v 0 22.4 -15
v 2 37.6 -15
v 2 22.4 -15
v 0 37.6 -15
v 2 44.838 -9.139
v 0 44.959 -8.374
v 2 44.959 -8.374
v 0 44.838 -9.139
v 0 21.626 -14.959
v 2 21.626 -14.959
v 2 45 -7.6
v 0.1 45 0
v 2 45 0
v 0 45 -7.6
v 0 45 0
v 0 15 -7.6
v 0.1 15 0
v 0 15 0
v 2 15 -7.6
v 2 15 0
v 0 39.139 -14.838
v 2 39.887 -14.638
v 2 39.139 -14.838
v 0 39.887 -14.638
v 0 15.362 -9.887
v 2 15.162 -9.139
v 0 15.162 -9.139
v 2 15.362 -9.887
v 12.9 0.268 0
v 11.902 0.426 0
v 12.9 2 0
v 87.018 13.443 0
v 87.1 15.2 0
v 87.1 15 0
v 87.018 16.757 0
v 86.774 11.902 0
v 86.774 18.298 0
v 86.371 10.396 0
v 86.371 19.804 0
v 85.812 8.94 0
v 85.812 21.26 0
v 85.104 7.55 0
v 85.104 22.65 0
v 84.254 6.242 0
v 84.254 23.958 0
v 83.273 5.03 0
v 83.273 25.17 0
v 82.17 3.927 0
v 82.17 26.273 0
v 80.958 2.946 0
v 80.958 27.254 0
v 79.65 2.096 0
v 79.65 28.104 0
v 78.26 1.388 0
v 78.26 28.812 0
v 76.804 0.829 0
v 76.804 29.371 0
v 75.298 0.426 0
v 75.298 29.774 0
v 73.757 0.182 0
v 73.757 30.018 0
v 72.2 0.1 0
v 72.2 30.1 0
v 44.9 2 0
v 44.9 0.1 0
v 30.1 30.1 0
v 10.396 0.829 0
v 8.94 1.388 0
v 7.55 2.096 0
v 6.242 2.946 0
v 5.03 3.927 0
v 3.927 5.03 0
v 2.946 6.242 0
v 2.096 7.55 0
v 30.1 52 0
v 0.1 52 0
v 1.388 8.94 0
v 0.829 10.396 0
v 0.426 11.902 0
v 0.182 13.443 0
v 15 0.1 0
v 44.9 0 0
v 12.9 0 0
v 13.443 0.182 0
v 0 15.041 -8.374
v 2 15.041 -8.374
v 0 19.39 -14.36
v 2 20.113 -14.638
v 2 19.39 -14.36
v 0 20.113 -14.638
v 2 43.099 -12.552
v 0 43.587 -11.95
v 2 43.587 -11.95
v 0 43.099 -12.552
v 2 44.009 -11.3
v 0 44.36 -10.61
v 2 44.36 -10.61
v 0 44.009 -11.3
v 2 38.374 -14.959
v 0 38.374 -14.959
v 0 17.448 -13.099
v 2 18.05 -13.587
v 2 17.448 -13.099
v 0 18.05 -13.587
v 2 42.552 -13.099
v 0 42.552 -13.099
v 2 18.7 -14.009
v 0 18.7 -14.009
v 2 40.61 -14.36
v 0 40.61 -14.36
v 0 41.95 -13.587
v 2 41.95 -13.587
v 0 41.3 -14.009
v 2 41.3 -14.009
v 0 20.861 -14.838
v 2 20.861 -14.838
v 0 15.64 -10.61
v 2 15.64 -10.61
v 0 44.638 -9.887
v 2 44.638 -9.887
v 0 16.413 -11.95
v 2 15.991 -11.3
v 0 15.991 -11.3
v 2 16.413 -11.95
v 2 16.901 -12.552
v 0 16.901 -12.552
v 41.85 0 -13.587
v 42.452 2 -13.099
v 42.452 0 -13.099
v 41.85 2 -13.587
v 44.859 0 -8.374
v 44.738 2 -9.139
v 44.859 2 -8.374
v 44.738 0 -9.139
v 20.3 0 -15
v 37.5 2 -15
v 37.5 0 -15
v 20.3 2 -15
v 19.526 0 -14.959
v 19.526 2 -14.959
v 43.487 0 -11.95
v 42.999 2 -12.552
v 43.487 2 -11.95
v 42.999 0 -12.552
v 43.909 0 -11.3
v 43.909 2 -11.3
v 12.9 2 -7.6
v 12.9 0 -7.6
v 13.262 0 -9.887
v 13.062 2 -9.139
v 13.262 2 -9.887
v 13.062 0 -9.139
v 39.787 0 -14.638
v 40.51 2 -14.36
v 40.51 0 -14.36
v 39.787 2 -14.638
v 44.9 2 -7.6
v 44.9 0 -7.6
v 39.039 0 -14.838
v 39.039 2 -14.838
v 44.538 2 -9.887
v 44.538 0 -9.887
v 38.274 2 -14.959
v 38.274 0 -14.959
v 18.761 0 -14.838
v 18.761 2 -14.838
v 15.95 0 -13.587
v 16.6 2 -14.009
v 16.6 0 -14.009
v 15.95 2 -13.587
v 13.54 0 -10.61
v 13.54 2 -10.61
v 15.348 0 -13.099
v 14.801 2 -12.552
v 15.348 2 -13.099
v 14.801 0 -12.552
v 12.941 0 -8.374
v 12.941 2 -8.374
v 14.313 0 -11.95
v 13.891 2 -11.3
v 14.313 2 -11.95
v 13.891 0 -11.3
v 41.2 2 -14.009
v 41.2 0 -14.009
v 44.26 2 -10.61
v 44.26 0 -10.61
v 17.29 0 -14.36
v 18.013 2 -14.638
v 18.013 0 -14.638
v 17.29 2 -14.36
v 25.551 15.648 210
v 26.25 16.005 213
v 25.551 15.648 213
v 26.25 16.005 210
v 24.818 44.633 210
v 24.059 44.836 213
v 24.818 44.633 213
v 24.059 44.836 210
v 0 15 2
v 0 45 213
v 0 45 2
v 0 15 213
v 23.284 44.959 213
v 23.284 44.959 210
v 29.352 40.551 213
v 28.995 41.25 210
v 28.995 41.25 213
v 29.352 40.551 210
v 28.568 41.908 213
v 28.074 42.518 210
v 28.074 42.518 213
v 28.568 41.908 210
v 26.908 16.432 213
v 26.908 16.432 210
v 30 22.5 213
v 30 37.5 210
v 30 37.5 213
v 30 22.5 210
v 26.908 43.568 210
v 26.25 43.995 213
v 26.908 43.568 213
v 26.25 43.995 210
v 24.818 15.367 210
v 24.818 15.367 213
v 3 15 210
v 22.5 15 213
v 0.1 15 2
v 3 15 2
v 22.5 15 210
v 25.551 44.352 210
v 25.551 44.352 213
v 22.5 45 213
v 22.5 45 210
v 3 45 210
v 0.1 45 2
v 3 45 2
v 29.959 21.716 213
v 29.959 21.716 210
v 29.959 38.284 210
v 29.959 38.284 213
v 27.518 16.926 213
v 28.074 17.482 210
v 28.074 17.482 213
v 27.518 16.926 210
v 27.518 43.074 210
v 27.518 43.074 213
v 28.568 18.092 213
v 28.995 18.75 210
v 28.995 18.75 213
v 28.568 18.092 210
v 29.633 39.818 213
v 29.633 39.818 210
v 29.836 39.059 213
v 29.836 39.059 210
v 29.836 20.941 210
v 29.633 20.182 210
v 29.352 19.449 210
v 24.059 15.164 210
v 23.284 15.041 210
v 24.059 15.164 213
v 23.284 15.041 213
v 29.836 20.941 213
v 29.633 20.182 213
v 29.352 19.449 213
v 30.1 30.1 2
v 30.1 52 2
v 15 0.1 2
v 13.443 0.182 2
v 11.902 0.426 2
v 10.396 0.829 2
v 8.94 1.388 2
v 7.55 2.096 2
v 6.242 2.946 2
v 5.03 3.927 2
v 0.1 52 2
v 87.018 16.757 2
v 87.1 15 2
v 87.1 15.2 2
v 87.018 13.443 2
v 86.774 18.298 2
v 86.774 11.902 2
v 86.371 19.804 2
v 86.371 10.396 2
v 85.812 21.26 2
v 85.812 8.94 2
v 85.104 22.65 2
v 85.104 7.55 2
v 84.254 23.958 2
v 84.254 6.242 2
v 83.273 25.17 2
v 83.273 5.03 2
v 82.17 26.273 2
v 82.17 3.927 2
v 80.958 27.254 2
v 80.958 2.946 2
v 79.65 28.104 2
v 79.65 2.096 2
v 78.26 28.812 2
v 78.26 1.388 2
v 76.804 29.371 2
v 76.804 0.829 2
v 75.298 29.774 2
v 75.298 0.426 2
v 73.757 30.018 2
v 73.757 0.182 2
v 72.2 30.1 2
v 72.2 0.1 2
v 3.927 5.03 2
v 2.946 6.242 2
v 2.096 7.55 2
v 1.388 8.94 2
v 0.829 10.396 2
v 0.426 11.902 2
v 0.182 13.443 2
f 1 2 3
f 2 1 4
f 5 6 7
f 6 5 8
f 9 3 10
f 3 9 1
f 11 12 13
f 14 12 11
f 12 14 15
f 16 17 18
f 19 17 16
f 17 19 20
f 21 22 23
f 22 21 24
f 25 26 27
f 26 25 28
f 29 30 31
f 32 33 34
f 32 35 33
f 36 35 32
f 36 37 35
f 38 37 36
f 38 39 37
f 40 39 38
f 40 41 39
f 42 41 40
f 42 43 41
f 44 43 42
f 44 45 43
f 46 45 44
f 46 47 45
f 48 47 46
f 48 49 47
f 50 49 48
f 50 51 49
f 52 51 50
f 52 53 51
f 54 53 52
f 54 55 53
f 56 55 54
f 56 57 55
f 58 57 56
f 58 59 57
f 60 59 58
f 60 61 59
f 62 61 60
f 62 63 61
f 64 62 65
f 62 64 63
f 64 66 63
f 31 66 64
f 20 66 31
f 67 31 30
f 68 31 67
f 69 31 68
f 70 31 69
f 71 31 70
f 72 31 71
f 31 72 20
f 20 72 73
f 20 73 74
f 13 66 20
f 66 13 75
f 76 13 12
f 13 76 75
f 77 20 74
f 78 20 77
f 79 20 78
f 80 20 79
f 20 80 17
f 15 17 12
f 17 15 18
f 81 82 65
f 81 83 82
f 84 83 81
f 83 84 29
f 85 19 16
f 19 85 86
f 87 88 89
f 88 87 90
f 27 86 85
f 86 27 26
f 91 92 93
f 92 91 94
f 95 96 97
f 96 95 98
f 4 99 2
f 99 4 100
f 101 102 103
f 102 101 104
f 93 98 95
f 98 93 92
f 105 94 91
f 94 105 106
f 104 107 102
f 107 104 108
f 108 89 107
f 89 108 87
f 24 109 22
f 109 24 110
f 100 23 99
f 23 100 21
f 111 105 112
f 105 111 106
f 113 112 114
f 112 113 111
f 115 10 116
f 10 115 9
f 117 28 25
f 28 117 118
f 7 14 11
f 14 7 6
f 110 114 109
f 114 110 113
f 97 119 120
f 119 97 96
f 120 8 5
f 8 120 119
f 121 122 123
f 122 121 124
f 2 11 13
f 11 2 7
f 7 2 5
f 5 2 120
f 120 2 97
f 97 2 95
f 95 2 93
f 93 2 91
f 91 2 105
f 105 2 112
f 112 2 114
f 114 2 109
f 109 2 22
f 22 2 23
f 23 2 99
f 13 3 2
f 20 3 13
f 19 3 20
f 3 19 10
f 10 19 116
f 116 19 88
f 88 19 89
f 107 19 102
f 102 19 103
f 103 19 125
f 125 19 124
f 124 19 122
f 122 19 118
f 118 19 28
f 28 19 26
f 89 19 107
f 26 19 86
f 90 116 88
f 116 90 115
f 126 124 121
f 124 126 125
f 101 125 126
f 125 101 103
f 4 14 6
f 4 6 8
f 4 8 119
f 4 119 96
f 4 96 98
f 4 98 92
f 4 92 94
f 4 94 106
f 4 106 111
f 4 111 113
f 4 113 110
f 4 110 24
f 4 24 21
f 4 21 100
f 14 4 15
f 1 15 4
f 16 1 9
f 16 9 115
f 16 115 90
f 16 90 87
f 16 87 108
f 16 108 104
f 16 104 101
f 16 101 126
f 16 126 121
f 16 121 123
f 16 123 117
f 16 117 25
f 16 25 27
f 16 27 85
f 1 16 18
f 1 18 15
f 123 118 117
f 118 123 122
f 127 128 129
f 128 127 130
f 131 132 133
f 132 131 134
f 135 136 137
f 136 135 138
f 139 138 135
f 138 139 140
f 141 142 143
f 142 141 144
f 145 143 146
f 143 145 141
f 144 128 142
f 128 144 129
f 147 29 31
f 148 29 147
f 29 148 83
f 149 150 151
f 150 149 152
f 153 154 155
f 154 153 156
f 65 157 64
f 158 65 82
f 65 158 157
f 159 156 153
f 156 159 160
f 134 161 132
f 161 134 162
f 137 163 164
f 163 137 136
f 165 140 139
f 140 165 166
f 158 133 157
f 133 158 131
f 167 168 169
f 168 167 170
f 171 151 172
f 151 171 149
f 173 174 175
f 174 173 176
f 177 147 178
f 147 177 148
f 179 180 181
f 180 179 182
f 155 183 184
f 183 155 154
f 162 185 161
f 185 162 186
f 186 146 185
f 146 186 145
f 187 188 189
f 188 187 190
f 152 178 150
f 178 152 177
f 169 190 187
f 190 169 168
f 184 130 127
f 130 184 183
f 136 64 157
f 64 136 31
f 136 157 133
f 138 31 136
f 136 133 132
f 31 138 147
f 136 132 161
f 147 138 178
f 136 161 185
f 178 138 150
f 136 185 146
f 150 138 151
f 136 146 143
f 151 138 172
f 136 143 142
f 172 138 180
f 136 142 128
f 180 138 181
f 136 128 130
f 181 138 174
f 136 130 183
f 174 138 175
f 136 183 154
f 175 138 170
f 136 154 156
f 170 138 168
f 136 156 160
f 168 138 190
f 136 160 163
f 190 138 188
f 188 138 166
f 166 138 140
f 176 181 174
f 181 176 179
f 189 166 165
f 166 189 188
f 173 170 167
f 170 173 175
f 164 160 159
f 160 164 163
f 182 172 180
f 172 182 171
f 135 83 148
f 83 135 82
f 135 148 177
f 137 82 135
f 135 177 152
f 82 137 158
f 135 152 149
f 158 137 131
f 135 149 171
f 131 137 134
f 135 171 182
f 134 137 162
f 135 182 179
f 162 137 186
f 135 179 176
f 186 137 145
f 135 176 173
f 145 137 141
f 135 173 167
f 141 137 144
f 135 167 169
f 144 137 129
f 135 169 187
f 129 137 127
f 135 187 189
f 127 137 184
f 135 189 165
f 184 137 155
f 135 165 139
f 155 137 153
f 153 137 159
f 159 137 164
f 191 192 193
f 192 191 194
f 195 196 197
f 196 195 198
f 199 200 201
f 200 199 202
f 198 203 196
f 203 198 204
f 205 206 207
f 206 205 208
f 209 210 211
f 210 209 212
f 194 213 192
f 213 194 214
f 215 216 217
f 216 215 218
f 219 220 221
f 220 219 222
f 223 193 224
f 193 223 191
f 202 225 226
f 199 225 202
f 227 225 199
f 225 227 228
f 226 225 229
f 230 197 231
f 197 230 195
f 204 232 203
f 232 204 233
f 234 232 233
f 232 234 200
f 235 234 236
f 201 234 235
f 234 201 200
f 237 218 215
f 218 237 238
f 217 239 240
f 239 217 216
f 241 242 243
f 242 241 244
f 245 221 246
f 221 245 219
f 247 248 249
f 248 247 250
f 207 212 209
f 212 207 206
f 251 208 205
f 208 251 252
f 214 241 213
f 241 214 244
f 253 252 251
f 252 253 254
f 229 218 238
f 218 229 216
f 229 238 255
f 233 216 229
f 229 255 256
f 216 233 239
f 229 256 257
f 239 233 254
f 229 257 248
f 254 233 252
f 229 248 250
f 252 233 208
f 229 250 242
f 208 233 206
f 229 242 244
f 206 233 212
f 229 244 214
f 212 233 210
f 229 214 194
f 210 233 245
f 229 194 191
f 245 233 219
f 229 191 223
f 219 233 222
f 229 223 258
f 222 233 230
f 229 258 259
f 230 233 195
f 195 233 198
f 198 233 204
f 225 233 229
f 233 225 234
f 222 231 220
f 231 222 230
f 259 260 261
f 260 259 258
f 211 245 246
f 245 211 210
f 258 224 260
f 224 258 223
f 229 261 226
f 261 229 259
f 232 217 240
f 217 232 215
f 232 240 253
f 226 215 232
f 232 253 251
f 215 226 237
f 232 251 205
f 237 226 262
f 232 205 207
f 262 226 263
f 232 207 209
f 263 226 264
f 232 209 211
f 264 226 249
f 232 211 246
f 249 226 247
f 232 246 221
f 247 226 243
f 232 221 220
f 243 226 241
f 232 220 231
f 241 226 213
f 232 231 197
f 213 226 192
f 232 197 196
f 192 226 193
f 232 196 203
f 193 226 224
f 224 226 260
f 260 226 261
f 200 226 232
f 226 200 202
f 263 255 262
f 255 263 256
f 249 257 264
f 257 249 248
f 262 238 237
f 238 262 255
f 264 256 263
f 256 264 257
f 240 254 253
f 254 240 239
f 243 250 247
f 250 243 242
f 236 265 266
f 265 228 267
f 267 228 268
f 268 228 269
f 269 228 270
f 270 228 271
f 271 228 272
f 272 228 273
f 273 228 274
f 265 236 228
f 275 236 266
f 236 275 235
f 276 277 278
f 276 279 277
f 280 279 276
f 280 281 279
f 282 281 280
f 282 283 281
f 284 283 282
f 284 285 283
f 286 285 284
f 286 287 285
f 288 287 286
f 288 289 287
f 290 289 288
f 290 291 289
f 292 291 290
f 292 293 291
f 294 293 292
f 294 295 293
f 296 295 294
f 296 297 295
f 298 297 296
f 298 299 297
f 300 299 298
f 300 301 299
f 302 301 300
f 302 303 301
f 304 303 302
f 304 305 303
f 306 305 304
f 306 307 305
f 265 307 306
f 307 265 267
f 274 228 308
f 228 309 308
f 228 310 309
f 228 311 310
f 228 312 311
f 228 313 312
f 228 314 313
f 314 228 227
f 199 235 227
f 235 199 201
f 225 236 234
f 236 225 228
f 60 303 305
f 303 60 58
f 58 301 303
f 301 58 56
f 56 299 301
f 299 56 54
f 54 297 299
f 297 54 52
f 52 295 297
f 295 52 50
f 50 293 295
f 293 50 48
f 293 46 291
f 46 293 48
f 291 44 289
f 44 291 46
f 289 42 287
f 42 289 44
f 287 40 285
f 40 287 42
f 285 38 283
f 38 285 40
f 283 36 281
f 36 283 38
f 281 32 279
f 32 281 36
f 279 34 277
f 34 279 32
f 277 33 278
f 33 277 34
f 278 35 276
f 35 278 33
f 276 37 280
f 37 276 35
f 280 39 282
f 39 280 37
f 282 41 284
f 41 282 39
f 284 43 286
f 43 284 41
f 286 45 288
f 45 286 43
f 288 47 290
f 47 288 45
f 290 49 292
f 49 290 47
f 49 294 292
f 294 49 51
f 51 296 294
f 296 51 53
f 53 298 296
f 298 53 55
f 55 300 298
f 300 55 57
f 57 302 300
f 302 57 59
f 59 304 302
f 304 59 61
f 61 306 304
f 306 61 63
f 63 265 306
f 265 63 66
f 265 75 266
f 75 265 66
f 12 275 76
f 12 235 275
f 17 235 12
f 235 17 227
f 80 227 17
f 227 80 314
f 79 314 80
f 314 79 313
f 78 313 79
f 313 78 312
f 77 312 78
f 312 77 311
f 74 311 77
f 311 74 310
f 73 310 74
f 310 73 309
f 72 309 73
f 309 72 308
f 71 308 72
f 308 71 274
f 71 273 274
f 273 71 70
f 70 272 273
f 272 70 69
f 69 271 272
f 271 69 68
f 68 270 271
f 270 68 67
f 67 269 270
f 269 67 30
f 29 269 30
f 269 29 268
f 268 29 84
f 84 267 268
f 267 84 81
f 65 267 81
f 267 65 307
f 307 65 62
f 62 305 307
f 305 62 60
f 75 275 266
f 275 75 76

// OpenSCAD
// file: ../modules.scad
description = "Common reusable OpenSCAD functions and modules";

// Clamp numeric value between bounds
function clamp(val, lo, hi) = max(lo, min(val, hi));

// Clamp chamfer height to half of available thickness
function clamp_chz(t, chz) = clamp(chz, 0, t/2);

// Clamp chamfer offsets to available XY span
function clamp_chxy(l, w, chx, chy) = [
  clamp(chx, 0, l/2 - tiny),
  clamp(chy, 0, w/2 - tiny)
];

// 2D rounded rectangle
// size = [width, height]
module rounded_rect(size=[10,10], radius=1, center=false) {
  width = size[0];
  height = size[1];
  r = min(radius, min(width, height)/2);
  translate(center ? [-width/2, -height/2] : [0, 0])
    offset(r=r)
      square([max(width - 2*r, tiny), max(height - 2*r, tiny)], center=false);
}

// 3D rounded box
// size = [width, depth, height]
module rounded_box(size=[10,10,10], radius=1, center=false) {
  width = size[0];
  depth = size[1];
  height = size[2];
  linear_extrude(height=height, center=center)
    rounded_rect([width, depth], radius, center=center);
}

// Cylindrical ring with chamfered top edge
// d_outer - outer diameter
// d_inner - inner diameter
// h - total height
// chamfer - radius for top edge transition
module round_chamfer_ring(d_outer, d_inner, h, chamfer) {
  h_ch = min(chamfer, h/2);
  difference() {
    cylinder(h=h - h_ch, d=d_outer);
    translate([0, 0, 0]) cylinder(h=h - h_ch + tiny, d=d_inner);
  }
  difference() {
    translate([0, 0, h - h_ch]) cylinder(h=h_ch, d1=d_outer, d2=max(d_outer - 2*h_ch, tiny));
    translate([0, 0, h - h_ch]) cylinder(h=h_ch + tiny, d1=d_inner, d2=max(d_inner + 2*h_ch, tiny));
  }
}

// Boolean inverse of child 2D geometry using large bounding square
module inverse_2d() {
  difference() {
    square([1e5, 1e5], center=true);
    children();
  }
}

// Offset a 2D shape outward by distance d
module offset_outside(d=1) {
  if (version_num() < 20130424)
    render() projection(cut=true) minkowski() {
      cylinder(r=d);
      linear_extrude(center=true) children(0);
    };
  else
    minkowski() {
      circle(r=d);
      children(0);
    }
}

// Offset a 2D shape inward by distance d
module offset_inside(d=1) {
  render() inverse_2d() offset_outside(d=d) inverse_2d() children(0);
}

// Add fillets of radius r to concave corners of a 2D shape
module fillet_corners(r=1) {
  offset_inside(d=r) render() offset_outside(d=r) children(0);
}

// Round convex corners of a 2D shape with radius r
module round_corners(r=1) {
  offset_outside(d=r) offset_inside(d=r) children(0);
}

// Create shell of width d along the edge of a 2D shape
// Positive d grows outward, negative inward; center=true centers on edge
module edge_shell(d, center=false) {
  if (center && d > 0) {
    difference() {
      offset_outside(d=d/2) children(0);
      offset_inside(d=d/2) children(0);
    }
  } else if (!center && d > 0) {
    difference() {
      offset_outside(d=d) children(0);
      children(0);
    }
  } else if (!center && d < 0) {
    difference() {
      children(0);
      offset_inside(d=-d) children(0);
    }
  } else {
    children(0);
  }
}
// main file
// =============================================
// 3D: Ceiling Corner Support for Printer Frame
// Version: 1.1
// Author: ChatGPT (OpenSCAD)
// =============================================
use <../modules.scad>;

// Short description for models table
description = "Ceiling Corner Support for Printer Frame";

// ----------------------------
// Описание модулей (фрагментов)
// ----------------------------
// base() — полная сборка: объединяет bottom_pad(len), corner_fillet_xy(...), post(h),
//          top_pad(), wrap_tabs(); len/h берутся из arm_len_full/post_h_full
//          или arm_len_tf/post_h_tf при test_fragment=true.
// top_pad() — верхняя площадка: pad_xy × pad_y, толщина top_pad_th; расположена на
//             Z = base_th + post_h_*; скругления контролируются radius_r.
// post(h) — вертикальная стойка сечением post_th × frame_w, высота h; основание на Z=base_th;
//           скругление рёбер ограничено min(radius_r, post_th/2).
// bottom_pad(len) — нижняя L‑образная площадка: две полосы шириной frame_w и длиной len,
//                   толщина base_th, внутренний угол со скруглением radius_r; уходит в +X и +Y.
// left_wrap() / right_wrap() — вертикальные «обжимные» лапки: ширина wrap_w, высота вниз wrap_h,
//                              толщина wrap_th; охватывают раму снаружи вдоль сторон Y и X.
// wrap_tabs() — объединяет обе лапки (left_wrap и right_wrap).
// (упрощено) Рёбра жёсткости и дополнительные косынки удалены из модели
// clip_for_fragments() — при test_fragment=true выводит два укороченных фрагмента; окна клипа
//                        задаются frag_size, frag_gap_x, frag_h_extra.

// ----------------------------
// Настройка точности
// ----------------------------
$fn = 0;        // фиксированную сегментацию отключаем
$fa = 6;        // 5–8° обычно достаточно
$fs = 0.35;     // ≈ диаметр сопла (0.3–0.5 для сопла 0.4)
pin_fs = 0.25;  // чуть тоньше для штырей и отверстий


// ----------------------------
// Тестовые фрагменты (стандартный блок)
// ----------------------------
test_fragment = false; // true — печатать только укороченные фрагменты
no_bottom_pad_left = true;
frag_size     = 50;    // размер квадрата вырезки, мм (для обрезки intersection)
frag_gap_x    = 10;    // зазор между фрагментами по X, мм
frag_h_extra  = 50;    // запас по высоте клипа, мм

// ----------------------------
// Фаски/скругления по краям
// ----------------------------
tiny = 0.1;                  // небольшой зазор для булевых операций

// Скругления
radius_r = 30;                 // общий радиус скруглений по 2D-контуром (мм)

// ----------------------------
// Параметры модели (все размеры в мм)
// ----------------------------
// Габариты рамы и подпорки
frame_w         = 30;        // ширина рамы принтера (и ширина подпорки)
post_th         = 3;         // толщина вертикальной стойки (подпорки)
post_y = radius_r/2;
base_th         = 2;         // толщина нижних горизонтальных лапок (площадка сверху рамы)
top_pad_th      = 3;         // толщина верхней квадратной площадки

// Высота
gap_total       = 213;       // расстояние от верха рамы до потолка
post_h_full     = gap_total - (base_th + top_pad_th); //= 208

// Горизонтальные лапки (на раму)
arm_len_full    = 87;        // длина лапок от угла рамы (по X и по Y)
// bottom_pad_r удалён — используем общий radius_r

// Вертикальные лапки (обхват снаружи)
wrap_h          = 15;        // высота вниз по Z (от 0 до -wrap_h)
wrap_w          = frame_w;   // ширина вдоль ребра (по X или Y)
wrap_th         = 2;         // толщина каждой вертикальной лапки (наружу, по X/Y)

// Верхняя площадка
pad_xy          = 30;        // 30x30 мм квадратная площадка сверху
pad_y           = 2*post_y;  // ширина по Y верхней площадки (в 2 раза больше post_y)

// (упрощено) блок параметров рёбер жёсткости удалён

// ----------------------------
// Значения для test_fragment
// ----------------------------
arm_len_tf      = 40;        // укороченная длина лапок
height_tf_total = 50;        // общая высота фрагмента
post_h_tf       = height_tf_total - (base_th + top_pad_th); // укороченная высота стойки

// ----------------------------
// Вспомогательные функции/модули
// ----------------------------
// 2D-скруглённый прямоугольник заданного размера (внешний габарит size=[x,y])
module rr2d_round_minY(size=[10,10], r=2){
    w = size[0]; h = size[1];
    r2 = min(r, w/2 - tiny, h/2 - tiny);
    union(){
        // Верхняя часть без скруглений
        translate([0, r2]) square([w, max(h - r2, tiny)], center=false);
        // Нижняя перемычка между кругами
        translate([r2, 0]) square([max(w - 2*r2, tiny), r2], center=false);
        // Кварткруги снизу слева и справа
        translate([r2, r2]) circle(r=r2);
        translate([w - r2, r2]) circle(r=r2);
    }
}

// 2D-прямоугольник с закруглением ТОЛЬКО на стороне minX (слева)
module rr2d_round_minX(size=[10,10], r=2){
    // Скругление только на стороне ПРАВАЯ (maxX); minX остаётся прямой
    w = size[0]; h = size[1];
    r2 = min(r, w/2 - tiny, h/2 - tiny);
    union(){
        // Основной прямоугольник по всей ширине без скругления слева
        square([w - r2, h], center=false);
        // Правые верх/низ закругляем четвертями круга у точки (w - r2, ...)
        translate([w - r2, r2]) circle(r=r2, $fs=pin_fs, $fa=6);
        translate([w - r2, h - r2]) circle(r=r2, $fs=pin_fs, $fa=6);
        // Вертикальная перемычка между четвертями
        translate([w - r2, r2]) square([r2, max(h - 2*r2, tiny)], center=false);
    }
}

// 2D-скруглённая L-форма: две полосы шириной w и длиной len, сходящиеся в углу (0,0)
module L2D(len, w, r){
    // Скругляем внешние углы без увеличения общей толщины w.
    r_eff = min(r, w/2 - tiny, len/2 - tiny);
    inner_len = max(len - 2*r_eff, tiny);
    inner_w   = max(w   - 2*r_eff, tiny);
    // Основная L-форма со скруглёнными внешними кромками
    offset(r=r_eff)
        union(){
            square([inner_len, inner_w], center=false);   // полоса по X (внутренняя)
            square([inner_w, inner_len], center=false);   // полоса по Y (внутренняя)
        }
}

// Верхняя квадратная площадка (с полукругом справа и скруглением левого края)
module top_pad(){
    translate([0, post_y, base_th + (test_fragment?post_h_tf:post_h_full)])
        linear_extrude(height=top_pad_th)
            rr2d_round_minX([pad_xy, pad_y], r=radius_r/4);
}

// Вертикальная стойка (30 x 3, высота post_h)
module post(h){
    // Прямоугольная стойка без скруглений, прижатая к внутреннему углу (minX=0, minY=0)
    translate([0, post_y, base_th])
        linear_extrude(height=h)
            square([post_th, frame_w], center=false);
}

// Нижние горизонтальные лапки-"Г" (толщина base_th)
module bottom_pad(len){
    translate([radius_r/2, post_y, 0])
        linear_extrude(height=base_th)
            L2D(len, frame_w, radius_r);
}

// Левая лапка (обхват по Y-стороне)
module left_wrap(){
    r_corner = min(radius_r, frame_w/2 - tiny);
    // wrap_w = max(wrap_w + wrap_th, tiny); // уменьшить охват по Y на wrap_th
    translate([wrap_th, post_y + wrap_w, -wrap_h])
        rotate([270,180,90])
            linear_extrude(height=wrap_th)
                rr2d_round_minY([wrap_w, wrap_h], r=min(radius_r, wrap_w/2 - tiny, wrap_h/2 - tiny));
}

// Правая лапка (обхват по X-стороне)
module right_wrap(){
    r_corner = min(radius_r, frame_w/2 - tiny);
    translate([frame_w + r_corner, 0, 0])
        rotate([0,90,90])
            linear_extrude(height=wrap_th)
                rr2d_round_minX([wrap_h, wrap_w + wrap_th], r=min(radius_r, (wrap_w + wrap_th)/2 - tiny, wrap_h/2 - tiny));
}

// Совместимость: собрать обе лапки
module wrap_tabs(){
    left_wrap();
    right_wrap();
}

// Опциональные рёбра жёсткости (две косынки вдоль X и Y)
// (упрощено) add_supports удалён — не используется

// Полная сборка модели
module base(){
    len = test_fragment ? arm_len_tf : arm_len_full;
    h = test_fragment ? post_h_tf   : post_h_full;

    union(){
        top_pad();
        post(h);
        bottom_pad(len);
        wrap_tabs();
        // (упрощено) дополнительные скругления и рёбра убраны
    }
}

// ---------------
// Клиппер фрагментов
// ---------------
module clip_for_fragments(){
    if(test_fragment){
        // Фрагмент у основания
        translate([0,0,0])
            intersection(){
                children();
                translate([0,0,-frag_h_extra])
                    cube([frag_size, frag_size, base_th + post_h_tf + top_pad_th + 2*frag_h_extra], center=false);
            }
        // Фрагмент у вершины (сдвинем по X для разнесения)
        translate([frag_size + frag_gap_x, 0, 0])
            intersection(){
                children();
                // окно вокруг верхней площадки
                z0 = base_th + max(post_h_tf - frag_size/2, 0);
                translate([0,0,z0])
                    cube([frag_size, frag_size, frag_size + frag_h_extra], center=false);
            }
    }else{
        children();
    }
}

module clip_for_bottom_pad_left(){
    if(no_bottom_pad_left)
        difference() {
            children();
            translate(v = [0, radius_r/2 + frame_w + 7, 0])
              cube([20+20, 50, 50], center=false);
        }
    else
        children();
}

// ----------------------------
// ВЫВОД МОДЕЛИ
// ----------------------------
clip_for_fragments() clip_for_bottom_pad_left() base();

// ----------------------------
// Примечания по ориентации:
// - Система координат выбрана так, что угол рамы находится в (0,0,0).
// - Лапки и площадки уходят в +X и +Y от угла. Левый наружный край — плоскость X=0.
// - Топ-площадка 30x30 мм расположена строго над стойкой.
// - Вертикальные лапки вниз (wrap_tabs) находятся только с внешней стороны угла: у Y=frame_w и X=frame_w.
// - Радиусы скругления по 2D-контуром = radius_r. Для стойки радиус ограничен её толщиной (минимум из radius_r и post_th/2).
